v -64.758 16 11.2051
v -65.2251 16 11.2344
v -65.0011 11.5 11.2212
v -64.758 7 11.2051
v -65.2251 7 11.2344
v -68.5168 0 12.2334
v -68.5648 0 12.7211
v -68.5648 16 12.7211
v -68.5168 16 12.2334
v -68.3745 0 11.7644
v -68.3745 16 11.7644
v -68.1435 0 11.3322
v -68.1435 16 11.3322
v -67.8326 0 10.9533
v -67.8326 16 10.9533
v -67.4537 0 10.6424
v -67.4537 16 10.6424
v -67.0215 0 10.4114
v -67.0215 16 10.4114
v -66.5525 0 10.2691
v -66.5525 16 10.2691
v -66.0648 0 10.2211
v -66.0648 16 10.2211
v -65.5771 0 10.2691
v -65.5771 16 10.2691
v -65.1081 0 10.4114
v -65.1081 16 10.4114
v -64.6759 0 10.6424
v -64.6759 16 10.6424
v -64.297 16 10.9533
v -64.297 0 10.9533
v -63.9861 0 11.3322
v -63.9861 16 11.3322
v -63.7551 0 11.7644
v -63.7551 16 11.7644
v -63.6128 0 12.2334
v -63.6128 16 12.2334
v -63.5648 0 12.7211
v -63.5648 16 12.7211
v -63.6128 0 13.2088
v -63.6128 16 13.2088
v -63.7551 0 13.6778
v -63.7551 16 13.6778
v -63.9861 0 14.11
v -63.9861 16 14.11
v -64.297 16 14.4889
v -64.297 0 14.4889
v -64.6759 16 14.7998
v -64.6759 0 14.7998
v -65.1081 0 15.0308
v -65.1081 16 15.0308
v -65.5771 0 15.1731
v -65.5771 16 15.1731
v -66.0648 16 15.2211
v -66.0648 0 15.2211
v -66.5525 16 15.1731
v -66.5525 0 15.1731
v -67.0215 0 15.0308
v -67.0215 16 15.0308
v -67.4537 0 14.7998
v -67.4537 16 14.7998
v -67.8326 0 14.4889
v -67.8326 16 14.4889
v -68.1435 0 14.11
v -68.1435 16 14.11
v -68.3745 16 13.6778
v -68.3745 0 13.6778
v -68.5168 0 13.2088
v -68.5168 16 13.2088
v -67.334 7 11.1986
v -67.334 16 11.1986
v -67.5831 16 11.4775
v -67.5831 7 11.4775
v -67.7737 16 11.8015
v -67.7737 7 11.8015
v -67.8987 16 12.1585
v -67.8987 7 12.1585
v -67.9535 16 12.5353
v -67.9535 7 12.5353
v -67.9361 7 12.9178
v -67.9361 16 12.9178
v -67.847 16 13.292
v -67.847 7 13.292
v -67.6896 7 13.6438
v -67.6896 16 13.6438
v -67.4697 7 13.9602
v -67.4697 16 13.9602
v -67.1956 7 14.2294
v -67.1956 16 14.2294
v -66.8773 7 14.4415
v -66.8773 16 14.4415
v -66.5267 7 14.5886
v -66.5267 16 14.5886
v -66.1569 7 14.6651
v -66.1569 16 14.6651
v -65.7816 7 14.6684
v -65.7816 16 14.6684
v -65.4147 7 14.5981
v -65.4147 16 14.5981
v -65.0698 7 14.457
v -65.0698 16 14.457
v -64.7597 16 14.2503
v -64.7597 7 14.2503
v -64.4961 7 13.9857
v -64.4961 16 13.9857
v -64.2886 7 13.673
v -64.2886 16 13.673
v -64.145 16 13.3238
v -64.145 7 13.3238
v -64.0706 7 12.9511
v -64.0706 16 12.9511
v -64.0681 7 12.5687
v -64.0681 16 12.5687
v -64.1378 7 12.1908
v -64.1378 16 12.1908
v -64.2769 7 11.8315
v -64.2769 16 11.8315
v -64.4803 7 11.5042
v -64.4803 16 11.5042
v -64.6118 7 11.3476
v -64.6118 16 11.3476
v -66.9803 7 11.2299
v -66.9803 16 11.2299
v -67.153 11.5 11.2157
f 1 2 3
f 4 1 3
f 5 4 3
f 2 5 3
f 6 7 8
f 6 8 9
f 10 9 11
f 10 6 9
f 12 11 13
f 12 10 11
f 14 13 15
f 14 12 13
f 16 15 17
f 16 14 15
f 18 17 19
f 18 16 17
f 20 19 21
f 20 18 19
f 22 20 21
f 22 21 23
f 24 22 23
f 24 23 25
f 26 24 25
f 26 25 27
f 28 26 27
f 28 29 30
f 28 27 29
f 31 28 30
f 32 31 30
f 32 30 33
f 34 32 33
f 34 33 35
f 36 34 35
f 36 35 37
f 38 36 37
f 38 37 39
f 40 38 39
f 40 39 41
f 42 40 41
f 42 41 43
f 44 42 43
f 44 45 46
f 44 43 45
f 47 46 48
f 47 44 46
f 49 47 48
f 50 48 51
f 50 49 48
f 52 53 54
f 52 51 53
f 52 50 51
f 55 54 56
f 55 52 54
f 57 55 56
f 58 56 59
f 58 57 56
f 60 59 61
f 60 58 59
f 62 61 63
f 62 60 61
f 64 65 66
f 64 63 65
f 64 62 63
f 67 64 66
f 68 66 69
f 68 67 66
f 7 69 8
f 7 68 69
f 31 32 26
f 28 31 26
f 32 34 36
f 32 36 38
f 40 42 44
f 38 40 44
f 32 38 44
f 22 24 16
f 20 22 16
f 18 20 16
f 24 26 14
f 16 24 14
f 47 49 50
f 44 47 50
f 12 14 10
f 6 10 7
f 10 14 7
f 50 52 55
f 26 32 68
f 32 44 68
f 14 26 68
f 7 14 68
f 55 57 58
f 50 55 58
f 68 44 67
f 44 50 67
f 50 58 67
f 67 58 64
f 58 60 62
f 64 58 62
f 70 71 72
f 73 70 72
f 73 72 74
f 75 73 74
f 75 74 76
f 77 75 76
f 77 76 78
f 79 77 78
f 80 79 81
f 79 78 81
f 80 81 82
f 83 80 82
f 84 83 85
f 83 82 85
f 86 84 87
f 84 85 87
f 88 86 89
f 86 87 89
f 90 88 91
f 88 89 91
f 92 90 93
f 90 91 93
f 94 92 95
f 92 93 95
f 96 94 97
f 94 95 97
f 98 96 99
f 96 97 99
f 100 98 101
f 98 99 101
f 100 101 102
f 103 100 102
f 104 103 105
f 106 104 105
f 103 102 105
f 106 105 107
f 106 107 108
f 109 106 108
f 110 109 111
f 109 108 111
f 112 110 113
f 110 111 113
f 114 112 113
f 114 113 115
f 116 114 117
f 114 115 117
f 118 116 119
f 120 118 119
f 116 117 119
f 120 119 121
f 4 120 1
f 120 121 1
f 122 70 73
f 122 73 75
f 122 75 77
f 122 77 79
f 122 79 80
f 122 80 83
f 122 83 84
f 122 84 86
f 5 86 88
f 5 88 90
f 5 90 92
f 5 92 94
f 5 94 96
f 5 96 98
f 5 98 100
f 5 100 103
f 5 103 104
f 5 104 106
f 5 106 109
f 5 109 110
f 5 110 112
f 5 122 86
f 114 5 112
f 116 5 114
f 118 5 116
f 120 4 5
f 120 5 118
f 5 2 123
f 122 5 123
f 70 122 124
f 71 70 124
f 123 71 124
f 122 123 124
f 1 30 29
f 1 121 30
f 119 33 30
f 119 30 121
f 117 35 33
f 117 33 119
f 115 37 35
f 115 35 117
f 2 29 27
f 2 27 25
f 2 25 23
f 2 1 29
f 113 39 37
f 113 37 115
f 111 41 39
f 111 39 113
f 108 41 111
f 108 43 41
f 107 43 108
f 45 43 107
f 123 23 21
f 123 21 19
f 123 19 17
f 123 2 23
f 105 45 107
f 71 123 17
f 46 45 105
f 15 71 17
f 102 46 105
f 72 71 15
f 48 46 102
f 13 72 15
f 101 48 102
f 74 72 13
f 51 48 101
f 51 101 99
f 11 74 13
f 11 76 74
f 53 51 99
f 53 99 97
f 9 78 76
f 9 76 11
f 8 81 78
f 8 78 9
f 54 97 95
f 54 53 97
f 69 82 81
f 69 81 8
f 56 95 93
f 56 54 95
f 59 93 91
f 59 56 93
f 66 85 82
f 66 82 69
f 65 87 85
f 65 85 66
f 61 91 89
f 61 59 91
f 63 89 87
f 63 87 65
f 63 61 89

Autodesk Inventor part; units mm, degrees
ref_plane "YZ Plane" through (0, 0, 0) normal (1, 0, 0) x (0, 1, 0)
ref_plane "XZ Plane" through (0, 0, 0) normal (0, 1, 0) x (-1, 0, 0)
ref_plane "XY Plane" through (0, 0, 0) normal (0, 0, 1) x (1, 0, 0)
sketch "Sketch1" plane through (0, 0, 0) normal (0, 1, 0) x (-1, 0, 0)
  circle A0 centre (66.0648, 12.7211) radius 2.5 projected
  circle A1 centre (66.0648, 12.7211) radius 2.5
  point P0 (0, 0)
  dimension "d7" = 5
extrude "Extrusion1" add sketch "Sketch1" along normal blind 16
sketch "Sketch2" plane through (-66.0648, 16, 12.7211) normal (0, 1, 0) x (1, 0, 0)
  line L0 (0.8397, 1.4867) -> (-0.9155, 1.4912)
  ellipse E0 centre (0.0567, 0.0303) end of major axis (-0.8862, 1.7941) minor radius 1.9327 (-1.2692, 1.5225) -> (1.3068, 1.516) ccw
  spline S0 degree 2 poles (1.3068, 1.516) (1.0542, 1.4985) (0.8397, 1.4867) knots 0 0 0 1 1 1 weights 1 1.006377 1
  spline S1 degree 2 poles (-0.9155, 1.4912) (-1.084, 1.5039) (-1.2692, 1.5225) knots 0 0 0 1 1 1 weights 1 1.006377 1
  point P0 (66.0648, 12.7211)
  point P1 (-1.3518, 1.4745)
extrude "Extrusion5" cut sketch "Sketch2" against normal blind 9
properties part number "acoplador"
